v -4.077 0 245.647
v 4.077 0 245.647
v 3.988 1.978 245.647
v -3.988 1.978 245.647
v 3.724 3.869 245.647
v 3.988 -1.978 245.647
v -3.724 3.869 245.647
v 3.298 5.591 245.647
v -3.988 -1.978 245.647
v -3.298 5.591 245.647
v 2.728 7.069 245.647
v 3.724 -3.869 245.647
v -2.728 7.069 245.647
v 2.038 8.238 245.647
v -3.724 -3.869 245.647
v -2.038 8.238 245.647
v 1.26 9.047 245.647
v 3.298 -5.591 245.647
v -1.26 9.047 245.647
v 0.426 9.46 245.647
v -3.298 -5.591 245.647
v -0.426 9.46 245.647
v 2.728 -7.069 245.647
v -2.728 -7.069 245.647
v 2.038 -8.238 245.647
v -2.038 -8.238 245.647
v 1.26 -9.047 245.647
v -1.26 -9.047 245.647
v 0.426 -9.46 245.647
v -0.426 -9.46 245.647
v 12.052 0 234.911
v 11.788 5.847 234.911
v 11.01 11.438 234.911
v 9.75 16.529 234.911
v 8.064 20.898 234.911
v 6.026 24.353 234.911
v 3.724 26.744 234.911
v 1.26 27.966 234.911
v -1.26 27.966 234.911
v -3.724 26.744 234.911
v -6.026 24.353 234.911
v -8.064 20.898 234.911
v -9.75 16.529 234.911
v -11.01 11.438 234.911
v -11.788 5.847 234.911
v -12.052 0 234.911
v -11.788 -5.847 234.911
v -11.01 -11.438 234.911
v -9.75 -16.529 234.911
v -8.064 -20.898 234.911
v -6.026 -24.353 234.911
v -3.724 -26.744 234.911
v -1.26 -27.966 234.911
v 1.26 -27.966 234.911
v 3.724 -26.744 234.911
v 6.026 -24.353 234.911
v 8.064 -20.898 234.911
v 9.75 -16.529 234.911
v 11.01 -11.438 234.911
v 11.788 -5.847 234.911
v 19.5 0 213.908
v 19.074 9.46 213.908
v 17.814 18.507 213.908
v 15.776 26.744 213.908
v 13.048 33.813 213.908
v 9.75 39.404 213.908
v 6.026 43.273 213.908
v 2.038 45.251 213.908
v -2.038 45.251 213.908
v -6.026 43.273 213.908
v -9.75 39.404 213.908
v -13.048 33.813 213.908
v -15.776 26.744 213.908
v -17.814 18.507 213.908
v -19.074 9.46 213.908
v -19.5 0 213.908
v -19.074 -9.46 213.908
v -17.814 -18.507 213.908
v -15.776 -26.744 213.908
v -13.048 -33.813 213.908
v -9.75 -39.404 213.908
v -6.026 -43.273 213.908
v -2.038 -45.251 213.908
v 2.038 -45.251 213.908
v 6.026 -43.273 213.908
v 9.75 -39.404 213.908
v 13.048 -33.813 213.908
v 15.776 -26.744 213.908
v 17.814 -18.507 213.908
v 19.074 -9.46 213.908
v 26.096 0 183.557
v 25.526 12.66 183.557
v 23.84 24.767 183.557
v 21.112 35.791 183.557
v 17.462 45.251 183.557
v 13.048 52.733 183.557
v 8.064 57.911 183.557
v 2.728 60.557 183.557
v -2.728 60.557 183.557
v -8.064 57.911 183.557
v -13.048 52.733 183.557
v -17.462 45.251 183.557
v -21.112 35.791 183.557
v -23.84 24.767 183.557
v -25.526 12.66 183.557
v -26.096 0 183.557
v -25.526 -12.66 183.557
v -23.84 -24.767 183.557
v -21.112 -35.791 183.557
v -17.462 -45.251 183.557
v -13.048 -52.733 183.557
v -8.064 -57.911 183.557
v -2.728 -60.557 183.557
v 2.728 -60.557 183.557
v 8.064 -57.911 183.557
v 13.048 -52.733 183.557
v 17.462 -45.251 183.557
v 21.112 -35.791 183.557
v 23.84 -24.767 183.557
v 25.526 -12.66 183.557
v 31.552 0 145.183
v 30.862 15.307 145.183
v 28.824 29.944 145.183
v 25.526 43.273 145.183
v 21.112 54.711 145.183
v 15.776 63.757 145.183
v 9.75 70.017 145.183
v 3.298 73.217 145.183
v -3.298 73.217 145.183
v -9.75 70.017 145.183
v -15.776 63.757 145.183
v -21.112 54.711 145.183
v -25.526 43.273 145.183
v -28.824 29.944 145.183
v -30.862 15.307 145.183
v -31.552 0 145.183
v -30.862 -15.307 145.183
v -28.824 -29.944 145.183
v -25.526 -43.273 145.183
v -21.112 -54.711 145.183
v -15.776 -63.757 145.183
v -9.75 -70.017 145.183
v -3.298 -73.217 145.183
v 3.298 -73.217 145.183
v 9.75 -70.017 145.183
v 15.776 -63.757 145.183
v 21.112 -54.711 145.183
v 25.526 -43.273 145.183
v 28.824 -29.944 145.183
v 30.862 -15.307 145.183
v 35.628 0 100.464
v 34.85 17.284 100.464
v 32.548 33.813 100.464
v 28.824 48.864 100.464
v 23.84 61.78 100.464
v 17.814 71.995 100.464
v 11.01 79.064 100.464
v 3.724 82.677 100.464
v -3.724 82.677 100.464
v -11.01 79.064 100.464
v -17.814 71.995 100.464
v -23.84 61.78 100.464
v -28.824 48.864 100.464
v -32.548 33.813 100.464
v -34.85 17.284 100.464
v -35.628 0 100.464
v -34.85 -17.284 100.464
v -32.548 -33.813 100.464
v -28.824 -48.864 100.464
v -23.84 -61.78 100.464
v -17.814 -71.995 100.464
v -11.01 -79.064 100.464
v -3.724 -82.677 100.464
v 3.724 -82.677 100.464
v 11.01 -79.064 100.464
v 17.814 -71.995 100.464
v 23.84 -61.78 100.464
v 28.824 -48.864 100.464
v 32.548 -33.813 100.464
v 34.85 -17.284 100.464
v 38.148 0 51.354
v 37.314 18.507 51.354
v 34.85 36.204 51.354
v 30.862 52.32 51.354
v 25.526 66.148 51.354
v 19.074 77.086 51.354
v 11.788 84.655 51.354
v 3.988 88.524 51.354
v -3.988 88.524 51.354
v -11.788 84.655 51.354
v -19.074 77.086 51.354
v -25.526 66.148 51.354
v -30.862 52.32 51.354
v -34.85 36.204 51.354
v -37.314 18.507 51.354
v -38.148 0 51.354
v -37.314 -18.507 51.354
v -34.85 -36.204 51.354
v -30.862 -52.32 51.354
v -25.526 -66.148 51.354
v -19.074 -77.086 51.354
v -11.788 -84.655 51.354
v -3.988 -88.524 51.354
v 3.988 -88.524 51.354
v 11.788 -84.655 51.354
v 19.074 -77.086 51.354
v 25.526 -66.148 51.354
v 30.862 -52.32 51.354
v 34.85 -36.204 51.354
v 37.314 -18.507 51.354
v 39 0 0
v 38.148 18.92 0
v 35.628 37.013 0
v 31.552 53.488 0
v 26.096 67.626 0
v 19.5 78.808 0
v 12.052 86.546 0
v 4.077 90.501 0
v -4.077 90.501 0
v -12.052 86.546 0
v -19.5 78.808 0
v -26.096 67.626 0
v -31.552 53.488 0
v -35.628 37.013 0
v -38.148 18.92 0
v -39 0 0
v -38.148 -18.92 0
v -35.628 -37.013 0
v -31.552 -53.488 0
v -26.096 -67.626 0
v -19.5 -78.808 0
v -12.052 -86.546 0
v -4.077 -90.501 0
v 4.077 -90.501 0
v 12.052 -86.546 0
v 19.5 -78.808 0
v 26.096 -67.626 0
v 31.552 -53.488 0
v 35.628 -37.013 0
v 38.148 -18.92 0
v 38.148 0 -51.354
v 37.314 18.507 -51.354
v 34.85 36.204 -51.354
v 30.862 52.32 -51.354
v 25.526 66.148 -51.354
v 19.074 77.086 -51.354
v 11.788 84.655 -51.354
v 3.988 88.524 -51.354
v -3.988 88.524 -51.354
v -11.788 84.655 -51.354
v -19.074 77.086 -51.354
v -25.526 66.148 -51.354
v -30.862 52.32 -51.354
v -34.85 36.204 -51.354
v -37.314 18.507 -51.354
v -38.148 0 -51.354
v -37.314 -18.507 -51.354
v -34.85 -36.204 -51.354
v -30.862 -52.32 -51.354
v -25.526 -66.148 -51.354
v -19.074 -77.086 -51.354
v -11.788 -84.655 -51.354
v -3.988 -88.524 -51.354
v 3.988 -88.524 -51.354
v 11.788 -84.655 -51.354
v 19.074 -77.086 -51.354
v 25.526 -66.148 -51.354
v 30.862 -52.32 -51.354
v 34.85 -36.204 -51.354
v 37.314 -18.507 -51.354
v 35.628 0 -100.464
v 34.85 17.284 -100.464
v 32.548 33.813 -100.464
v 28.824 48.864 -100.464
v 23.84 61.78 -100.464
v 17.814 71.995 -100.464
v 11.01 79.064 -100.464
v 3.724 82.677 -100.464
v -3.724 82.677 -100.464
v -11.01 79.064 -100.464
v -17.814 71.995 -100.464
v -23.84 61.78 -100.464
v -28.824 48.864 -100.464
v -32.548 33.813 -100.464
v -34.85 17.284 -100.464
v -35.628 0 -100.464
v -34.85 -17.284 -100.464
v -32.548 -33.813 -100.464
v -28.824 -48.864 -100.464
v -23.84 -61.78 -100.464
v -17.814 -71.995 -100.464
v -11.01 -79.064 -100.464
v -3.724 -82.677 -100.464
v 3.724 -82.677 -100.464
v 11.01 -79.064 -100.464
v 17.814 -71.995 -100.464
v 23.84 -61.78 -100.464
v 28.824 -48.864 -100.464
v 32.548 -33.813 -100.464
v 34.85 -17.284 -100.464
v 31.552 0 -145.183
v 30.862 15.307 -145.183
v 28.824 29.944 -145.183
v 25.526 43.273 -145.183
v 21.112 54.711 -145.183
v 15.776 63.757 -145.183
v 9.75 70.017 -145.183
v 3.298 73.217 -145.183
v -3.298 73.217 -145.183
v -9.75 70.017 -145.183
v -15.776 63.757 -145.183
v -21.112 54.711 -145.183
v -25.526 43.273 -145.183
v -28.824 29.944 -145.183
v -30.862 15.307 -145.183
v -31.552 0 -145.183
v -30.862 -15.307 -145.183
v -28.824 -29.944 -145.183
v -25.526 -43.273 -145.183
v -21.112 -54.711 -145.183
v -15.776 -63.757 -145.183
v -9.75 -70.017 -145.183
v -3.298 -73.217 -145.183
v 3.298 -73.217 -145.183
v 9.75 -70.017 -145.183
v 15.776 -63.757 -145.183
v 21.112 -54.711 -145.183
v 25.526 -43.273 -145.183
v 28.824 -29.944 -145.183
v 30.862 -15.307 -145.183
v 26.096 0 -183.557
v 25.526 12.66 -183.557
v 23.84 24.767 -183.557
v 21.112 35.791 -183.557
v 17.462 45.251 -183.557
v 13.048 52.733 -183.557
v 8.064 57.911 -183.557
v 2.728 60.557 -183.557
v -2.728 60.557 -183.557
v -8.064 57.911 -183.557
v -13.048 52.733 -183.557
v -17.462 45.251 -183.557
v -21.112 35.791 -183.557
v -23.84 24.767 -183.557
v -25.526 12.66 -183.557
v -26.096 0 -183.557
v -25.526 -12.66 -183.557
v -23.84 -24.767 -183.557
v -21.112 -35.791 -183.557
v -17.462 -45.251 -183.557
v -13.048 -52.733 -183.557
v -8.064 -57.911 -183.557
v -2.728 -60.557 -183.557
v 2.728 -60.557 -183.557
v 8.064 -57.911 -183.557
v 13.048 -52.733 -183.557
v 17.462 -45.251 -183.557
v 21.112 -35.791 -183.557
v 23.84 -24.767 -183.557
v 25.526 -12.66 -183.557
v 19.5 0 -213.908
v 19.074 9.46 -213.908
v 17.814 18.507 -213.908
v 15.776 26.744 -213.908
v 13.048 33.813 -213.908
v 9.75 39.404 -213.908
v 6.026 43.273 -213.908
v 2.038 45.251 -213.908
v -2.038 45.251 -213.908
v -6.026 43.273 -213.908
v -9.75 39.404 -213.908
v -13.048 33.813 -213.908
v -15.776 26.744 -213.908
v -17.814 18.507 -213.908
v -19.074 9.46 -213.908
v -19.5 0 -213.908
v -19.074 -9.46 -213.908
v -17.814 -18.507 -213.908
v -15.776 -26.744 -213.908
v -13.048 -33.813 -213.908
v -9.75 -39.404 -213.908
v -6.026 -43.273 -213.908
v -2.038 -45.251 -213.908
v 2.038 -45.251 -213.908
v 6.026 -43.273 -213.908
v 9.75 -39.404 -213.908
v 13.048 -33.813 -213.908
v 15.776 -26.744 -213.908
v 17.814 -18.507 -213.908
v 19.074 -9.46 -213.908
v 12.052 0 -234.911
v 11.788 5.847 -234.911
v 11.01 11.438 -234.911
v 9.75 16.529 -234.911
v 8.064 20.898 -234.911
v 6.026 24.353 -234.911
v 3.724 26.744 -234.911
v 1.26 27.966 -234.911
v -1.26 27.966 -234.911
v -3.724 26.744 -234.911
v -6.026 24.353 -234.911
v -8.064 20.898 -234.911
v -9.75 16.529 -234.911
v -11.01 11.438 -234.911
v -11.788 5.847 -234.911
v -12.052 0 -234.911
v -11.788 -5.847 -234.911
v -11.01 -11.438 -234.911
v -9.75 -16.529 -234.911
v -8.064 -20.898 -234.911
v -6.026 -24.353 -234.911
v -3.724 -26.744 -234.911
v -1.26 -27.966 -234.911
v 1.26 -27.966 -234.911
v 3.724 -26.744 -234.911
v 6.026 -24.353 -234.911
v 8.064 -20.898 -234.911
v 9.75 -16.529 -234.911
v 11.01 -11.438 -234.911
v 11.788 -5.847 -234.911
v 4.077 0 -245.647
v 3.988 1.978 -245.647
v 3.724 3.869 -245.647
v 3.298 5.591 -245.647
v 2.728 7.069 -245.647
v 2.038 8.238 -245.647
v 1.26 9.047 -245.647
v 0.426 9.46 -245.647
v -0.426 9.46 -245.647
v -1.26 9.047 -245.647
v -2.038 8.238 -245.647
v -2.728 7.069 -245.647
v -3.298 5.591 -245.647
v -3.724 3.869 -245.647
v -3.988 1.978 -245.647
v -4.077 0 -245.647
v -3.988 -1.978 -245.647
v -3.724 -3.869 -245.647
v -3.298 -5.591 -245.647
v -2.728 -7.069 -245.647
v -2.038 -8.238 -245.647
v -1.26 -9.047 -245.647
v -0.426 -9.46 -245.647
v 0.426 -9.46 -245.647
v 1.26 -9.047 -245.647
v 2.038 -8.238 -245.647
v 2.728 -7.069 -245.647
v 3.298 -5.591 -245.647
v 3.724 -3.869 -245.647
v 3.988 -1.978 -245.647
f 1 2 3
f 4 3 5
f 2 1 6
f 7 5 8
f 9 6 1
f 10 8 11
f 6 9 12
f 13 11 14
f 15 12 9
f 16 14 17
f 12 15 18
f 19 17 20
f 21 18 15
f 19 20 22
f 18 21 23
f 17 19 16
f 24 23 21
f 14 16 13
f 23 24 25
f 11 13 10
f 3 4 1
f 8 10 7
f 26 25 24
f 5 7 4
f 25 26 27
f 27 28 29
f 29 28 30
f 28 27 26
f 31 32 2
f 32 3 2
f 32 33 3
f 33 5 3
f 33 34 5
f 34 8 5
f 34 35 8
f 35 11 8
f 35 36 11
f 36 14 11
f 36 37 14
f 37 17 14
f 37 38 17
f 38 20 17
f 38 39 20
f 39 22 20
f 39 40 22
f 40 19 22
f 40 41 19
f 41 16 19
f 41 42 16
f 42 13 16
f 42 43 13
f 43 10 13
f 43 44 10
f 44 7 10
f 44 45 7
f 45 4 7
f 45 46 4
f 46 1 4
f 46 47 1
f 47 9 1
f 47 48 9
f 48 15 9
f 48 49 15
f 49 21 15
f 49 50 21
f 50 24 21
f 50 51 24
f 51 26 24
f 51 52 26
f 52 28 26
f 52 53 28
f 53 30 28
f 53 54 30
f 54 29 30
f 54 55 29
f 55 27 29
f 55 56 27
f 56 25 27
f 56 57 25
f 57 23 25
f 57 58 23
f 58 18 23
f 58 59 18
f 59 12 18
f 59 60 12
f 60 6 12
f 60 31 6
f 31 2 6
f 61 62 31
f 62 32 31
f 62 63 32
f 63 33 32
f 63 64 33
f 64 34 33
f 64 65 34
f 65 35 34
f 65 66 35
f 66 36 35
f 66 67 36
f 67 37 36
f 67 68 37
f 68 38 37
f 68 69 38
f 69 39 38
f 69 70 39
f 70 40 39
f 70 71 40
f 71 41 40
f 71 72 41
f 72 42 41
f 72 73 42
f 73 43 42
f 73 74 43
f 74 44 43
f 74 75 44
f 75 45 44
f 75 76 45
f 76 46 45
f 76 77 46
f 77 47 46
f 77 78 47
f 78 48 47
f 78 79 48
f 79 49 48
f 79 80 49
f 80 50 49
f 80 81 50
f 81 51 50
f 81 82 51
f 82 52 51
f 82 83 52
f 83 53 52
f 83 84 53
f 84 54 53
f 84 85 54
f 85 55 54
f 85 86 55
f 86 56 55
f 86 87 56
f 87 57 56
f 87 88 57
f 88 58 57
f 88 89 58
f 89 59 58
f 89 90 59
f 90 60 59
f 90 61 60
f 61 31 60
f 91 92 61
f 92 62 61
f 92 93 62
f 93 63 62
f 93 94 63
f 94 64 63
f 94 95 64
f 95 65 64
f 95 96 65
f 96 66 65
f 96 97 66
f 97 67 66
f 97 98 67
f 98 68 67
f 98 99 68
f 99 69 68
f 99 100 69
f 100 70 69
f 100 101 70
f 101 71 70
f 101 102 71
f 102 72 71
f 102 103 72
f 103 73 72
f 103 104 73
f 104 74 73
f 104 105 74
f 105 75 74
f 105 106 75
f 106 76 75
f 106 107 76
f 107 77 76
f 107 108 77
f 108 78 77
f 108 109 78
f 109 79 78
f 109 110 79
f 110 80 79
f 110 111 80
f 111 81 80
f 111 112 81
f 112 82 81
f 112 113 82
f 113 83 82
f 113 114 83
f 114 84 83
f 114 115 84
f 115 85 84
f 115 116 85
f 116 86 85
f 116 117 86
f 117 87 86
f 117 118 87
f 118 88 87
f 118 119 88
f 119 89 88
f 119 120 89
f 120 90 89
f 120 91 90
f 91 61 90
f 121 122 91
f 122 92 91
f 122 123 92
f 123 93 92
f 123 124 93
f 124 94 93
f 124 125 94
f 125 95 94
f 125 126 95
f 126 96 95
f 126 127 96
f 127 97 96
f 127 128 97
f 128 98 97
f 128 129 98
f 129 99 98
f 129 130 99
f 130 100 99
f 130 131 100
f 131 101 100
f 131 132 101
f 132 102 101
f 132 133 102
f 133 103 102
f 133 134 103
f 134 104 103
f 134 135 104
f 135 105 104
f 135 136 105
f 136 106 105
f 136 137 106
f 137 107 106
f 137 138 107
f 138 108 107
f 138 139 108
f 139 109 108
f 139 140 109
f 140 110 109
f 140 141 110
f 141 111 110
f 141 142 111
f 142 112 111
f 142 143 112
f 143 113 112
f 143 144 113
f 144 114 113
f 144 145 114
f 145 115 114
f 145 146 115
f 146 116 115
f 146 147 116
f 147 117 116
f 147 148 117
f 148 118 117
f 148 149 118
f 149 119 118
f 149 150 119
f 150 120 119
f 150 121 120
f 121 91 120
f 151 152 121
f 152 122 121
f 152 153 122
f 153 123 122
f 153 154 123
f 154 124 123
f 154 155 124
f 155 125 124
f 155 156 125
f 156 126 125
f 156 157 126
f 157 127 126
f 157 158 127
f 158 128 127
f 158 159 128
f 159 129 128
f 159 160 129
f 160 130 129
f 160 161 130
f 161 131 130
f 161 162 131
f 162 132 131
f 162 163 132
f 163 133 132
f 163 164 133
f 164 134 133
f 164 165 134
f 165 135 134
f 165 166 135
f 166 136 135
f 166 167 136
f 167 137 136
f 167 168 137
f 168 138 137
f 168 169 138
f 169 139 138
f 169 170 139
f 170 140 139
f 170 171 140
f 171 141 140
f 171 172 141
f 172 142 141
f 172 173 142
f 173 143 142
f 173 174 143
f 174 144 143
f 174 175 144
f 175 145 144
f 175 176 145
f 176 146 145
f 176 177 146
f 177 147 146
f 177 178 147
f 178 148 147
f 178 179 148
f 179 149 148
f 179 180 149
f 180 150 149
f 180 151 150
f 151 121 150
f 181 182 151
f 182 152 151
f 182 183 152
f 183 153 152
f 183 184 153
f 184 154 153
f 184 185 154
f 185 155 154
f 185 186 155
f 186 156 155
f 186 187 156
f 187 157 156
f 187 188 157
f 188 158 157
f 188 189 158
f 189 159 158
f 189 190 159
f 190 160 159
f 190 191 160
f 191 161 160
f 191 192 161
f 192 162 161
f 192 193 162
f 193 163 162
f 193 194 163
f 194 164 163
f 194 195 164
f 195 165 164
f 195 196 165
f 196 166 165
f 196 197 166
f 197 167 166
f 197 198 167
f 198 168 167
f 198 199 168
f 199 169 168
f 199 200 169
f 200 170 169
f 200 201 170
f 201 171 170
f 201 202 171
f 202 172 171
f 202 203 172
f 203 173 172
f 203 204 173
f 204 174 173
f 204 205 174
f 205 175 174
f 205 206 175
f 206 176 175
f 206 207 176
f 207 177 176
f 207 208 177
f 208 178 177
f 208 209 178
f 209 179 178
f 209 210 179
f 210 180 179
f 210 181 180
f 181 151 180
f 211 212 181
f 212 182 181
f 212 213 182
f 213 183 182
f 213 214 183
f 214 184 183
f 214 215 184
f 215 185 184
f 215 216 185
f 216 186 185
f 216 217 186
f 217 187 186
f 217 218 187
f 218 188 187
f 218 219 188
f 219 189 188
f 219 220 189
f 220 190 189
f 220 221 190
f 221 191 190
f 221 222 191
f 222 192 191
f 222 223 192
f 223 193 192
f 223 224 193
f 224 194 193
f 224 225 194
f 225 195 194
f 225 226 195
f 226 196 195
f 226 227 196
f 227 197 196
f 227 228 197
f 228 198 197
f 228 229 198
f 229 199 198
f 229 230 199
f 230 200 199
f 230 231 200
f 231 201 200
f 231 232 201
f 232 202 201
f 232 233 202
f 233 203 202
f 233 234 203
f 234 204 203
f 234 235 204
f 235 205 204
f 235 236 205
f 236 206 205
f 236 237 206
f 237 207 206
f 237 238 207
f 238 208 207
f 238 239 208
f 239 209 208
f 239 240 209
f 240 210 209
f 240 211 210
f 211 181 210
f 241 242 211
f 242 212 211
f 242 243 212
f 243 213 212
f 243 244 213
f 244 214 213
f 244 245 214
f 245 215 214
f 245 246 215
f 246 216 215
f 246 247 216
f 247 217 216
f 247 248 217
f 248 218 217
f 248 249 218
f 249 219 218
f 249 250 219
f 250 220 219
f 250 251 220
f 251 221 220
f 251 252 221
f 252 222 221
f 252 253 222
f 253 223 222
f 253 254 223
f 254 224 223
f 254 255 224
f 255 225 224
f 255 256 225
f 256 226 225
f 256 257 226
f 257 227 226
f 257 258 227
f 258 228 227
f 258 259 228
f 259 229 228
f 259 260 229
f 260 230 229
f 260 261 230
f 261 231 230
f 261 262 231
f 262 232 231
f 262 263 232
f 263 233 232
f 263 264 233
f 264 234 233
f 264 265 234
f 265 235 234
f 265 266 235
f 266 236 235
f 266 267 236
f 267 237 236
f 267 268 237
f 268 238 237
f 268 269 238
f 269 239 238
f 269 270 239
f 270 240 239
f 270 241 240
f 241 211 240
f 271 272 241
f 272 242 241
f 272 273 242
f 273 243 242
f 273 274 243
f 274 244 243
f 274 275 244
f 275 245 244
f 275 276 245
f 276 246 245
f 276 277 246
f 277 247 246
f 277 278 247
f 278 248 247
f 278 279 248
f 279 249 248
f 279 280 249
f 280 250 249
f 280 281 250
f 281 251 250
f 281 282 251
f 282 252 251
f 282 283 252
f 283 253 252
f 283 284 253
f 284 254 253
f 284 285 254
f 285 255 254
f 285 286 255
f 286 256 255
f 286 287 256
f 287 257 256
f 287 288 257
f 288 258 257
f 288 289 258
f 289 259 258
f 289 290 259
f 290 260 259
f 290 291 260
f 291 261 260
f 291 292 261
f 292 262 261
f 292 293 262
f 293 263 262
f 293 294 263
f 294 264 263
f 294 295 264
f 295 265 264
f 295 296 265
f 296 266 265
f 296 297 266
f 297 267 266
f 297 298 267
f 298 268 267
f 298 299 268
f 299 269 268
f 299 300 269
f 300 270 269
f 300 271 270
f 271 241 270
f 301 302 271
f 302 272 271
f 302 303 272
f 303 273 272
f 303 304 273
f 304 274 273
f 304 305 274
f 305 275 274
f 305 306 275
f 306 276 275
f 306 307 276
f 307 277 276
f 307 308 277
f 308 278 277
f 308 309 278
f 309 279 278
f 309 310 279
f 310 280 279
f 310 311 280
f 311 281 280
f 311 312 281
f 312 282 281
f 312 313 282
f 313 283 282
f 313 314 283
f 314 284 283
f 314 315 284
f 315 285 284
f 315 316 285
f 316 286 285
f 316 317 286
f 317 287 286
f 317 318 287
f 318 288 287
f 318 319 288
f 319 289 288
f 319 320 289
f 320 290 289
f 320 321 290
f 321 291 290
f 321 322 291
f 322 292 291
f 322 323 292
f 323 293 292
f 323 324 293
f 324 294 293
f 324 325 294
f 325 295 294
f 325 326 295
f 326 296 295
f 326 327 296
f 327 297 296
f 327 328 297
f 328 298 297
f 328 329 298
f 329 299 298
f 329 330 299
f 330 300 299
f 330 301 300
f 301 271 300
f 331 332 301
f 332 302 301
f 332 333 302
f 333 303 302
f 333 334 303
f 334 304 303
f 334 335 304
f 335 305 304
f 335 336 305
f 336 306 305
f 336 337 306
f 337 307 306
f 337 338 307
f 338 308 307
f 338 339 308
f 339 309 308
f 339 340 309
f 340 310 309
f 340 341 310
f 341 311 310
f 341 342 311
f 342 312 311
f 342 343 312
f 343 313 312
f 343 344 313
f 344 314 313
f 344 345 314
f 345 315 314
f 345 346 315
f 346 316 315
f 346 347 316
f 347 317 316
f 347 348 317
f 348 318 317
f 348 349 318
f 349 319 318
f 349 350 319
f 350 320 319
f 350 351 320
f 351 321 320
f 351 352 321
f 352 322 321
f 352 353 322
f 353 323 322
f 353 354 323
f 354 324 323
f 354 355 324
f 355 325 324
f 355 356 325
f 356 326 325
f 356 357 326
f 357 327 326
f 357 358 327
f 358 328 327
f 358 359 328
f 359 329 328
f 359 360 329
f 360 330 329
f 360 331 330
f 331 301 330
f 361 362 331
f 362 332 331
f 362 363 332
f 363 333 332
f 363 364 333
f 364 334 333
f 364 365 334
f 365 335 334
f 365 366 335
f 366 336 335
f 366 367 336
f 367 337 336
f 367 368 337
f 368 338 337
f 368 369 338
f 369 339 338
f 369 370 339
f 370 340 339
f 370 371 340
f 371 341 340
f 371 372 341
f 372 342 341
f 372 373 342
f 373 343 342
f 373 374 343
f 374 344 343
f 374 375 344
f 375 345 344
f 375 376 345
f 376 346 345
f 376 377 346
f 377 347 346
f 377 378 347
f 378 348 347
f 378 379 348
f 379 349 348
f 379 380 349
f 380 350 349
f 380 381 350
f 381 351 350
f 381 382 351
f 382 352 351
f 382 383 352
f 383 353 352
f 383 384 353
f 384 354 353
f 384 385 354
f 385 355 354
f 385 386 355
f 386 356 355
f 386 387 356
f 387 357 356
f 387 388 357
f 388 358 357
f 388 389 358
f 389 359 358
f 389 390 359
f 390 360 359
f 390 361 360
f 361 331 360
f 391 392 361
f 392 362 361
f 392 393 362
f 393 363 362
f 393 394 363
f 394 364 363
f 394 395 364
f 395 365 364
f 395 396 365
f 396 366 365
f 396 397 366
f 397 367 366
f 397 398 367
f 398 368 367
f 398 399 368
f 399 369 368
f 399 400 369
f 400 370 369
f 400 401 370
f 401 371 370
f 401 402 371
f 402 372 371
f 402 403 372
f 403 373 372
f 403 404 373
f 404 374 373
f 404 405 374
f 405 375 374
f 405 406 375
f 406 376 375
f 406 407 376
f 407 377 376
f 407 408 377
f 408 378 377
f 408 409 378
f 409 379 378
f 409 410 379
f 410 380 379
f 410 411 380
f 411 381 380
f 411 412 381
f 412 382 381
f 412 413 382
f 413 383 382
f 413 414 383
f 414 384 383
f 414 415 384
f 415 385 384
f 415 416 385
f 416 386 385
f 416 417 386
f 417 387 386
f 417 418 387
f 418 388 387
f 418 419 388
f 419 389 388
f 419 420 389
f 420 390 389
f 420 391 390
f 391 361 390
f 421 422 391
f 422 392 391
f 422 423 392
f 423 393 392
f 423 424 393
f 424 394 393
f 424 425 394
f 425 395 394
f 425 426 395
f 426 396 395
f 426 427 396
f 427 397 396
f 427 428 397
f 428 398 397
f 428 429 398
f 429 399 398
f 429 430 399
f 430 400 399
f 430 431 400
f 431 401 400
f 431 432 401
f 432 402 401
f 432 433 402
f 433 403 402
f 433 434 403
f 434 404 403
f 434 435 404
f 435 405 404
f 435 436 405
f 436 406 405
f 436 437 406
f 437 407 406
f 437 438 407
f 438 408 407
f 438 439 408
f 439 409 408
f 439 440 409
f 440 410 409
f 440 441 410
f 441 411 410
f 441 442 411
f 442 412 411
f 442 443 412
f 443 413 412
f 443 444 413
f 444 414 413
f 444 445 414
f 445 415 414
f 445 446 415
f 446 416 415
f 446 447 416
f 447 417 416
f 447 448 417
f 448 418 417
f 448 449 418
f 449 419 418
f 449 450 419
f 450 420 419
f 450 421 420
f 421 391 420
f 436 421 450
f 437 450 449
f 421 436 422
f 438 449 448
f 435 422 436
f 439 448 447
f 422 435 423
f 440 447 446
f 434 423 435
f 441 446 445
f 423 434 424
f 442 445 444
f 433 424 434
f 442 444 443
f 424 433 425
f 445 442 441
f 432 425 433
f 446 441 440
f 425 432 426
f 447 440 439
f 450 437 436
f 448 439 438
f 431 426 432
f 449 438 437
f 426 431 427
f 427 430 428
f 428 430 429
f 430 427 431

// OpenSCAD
// Generated by SolidPython 1.0.1 on 2020-07-29 00:46:45


scale(v = [3, 7, 19]) {
	sphere(r = 13);
}
/***********************************************
*********      SolidPython code:      **********
************************************************
 
# import packages: SolidPython
from solid import *
from solid.utils import *
from itertools import chain, combinations, permutations


class Resize:

    def __init__(self, scad_file):
        self.scad_file = scad_file
        #self.scad_file = import_scad(scad_file)
        # cone/cylinder param:
        self.r1 = 0
        self.r2 = 0
        self.h = 0
        # rectangular prism param:
        self.w = 0
        self.l = 0
        # ellipse param:
        self.r = 0

    # import OpenScad code (file name corresponds to shape)


    # classify shape + parameters
    def assign(self, param1, param2, param3):
        if self.scad_file == 'cone.scad':
            self.r1 = param1
            self.r2 = param2
            self.h = param3
        elif self.scad_file == 'cylinder.scad':
            self.r1 = param1
            self.r2 = param2
            self.h = param3
        elif self.scad_file == 'rectangularPrism.scad':
            self.h = param1
            self.l = param2
            self.w = param3
        else:
            self.r = param1
            self.h = param2

    # resize parameters
    def iterate(self):
        x = range(3, 20, 2)
        i = 1
        if self.scad_file == 'cone.scad':
            tempList = list(permutations(x, 2))
            for temp in tempList:
                param1 = temp[0]
                param2 = temp[1]
                filepath = 'produced_scad_files/' + 'cone' + str(param1) + '_' + str(param2) + '_' + '.scad'
                scad_render_to_file(cylinder(h=param1, r1=param2, r2=0), filepath)

        elif self.scad_file == 'cylinder.scad':
            tempList = list(permutations(x, 3))
            for temp in tempList:
                param1 = temp[0]
                param2 = temp[1]
                filepath = 'produced_scad_files/' + 'cylinder' + str(param1) + '_' + str(param2) + '_' + '.scad'
                scad_render_to_file(cylinder(h=param1, r1=param2, r2=param2), filepath)

        elif self.scad_file == 'rectangularPrism.scad':
            tempList = list(permutations(x, 3))
            for temp in tempList:
                param1 = temp[0]
                param2 = temp[1]
                param3 = temp[2]
                filepath = 'produced_scad_files/' + 'rectangularPrism' + str(param1) + '_' + str(param2) + '_' + str(
                    param3) + '.scad'
                scad_render_to_file(cube(size=(param1, param2, param3)), filepath)

        elif self.scad_file == 'ellipse.scad':
            tempList = list(permutations(x, 4))
            for temp in tempList:
                param1 = temp[0]
                param2 = temp[1]
                param3 = temp[2]
                param4 = temp[3]
                filepath = 'produced_scad_files/' + 'ellipse' + str(param1) + '_' + str(param2) + '_' + str(param3) + '_' + str(param4) + '.scad'
                scad_render_to_file(scale([param1, param2, param3])(sphere(r=param4)), filepath)

    def render_to_scadfile(self):
        scad_render_to_file(scad, 'example.scad') 
 
************************************************/
